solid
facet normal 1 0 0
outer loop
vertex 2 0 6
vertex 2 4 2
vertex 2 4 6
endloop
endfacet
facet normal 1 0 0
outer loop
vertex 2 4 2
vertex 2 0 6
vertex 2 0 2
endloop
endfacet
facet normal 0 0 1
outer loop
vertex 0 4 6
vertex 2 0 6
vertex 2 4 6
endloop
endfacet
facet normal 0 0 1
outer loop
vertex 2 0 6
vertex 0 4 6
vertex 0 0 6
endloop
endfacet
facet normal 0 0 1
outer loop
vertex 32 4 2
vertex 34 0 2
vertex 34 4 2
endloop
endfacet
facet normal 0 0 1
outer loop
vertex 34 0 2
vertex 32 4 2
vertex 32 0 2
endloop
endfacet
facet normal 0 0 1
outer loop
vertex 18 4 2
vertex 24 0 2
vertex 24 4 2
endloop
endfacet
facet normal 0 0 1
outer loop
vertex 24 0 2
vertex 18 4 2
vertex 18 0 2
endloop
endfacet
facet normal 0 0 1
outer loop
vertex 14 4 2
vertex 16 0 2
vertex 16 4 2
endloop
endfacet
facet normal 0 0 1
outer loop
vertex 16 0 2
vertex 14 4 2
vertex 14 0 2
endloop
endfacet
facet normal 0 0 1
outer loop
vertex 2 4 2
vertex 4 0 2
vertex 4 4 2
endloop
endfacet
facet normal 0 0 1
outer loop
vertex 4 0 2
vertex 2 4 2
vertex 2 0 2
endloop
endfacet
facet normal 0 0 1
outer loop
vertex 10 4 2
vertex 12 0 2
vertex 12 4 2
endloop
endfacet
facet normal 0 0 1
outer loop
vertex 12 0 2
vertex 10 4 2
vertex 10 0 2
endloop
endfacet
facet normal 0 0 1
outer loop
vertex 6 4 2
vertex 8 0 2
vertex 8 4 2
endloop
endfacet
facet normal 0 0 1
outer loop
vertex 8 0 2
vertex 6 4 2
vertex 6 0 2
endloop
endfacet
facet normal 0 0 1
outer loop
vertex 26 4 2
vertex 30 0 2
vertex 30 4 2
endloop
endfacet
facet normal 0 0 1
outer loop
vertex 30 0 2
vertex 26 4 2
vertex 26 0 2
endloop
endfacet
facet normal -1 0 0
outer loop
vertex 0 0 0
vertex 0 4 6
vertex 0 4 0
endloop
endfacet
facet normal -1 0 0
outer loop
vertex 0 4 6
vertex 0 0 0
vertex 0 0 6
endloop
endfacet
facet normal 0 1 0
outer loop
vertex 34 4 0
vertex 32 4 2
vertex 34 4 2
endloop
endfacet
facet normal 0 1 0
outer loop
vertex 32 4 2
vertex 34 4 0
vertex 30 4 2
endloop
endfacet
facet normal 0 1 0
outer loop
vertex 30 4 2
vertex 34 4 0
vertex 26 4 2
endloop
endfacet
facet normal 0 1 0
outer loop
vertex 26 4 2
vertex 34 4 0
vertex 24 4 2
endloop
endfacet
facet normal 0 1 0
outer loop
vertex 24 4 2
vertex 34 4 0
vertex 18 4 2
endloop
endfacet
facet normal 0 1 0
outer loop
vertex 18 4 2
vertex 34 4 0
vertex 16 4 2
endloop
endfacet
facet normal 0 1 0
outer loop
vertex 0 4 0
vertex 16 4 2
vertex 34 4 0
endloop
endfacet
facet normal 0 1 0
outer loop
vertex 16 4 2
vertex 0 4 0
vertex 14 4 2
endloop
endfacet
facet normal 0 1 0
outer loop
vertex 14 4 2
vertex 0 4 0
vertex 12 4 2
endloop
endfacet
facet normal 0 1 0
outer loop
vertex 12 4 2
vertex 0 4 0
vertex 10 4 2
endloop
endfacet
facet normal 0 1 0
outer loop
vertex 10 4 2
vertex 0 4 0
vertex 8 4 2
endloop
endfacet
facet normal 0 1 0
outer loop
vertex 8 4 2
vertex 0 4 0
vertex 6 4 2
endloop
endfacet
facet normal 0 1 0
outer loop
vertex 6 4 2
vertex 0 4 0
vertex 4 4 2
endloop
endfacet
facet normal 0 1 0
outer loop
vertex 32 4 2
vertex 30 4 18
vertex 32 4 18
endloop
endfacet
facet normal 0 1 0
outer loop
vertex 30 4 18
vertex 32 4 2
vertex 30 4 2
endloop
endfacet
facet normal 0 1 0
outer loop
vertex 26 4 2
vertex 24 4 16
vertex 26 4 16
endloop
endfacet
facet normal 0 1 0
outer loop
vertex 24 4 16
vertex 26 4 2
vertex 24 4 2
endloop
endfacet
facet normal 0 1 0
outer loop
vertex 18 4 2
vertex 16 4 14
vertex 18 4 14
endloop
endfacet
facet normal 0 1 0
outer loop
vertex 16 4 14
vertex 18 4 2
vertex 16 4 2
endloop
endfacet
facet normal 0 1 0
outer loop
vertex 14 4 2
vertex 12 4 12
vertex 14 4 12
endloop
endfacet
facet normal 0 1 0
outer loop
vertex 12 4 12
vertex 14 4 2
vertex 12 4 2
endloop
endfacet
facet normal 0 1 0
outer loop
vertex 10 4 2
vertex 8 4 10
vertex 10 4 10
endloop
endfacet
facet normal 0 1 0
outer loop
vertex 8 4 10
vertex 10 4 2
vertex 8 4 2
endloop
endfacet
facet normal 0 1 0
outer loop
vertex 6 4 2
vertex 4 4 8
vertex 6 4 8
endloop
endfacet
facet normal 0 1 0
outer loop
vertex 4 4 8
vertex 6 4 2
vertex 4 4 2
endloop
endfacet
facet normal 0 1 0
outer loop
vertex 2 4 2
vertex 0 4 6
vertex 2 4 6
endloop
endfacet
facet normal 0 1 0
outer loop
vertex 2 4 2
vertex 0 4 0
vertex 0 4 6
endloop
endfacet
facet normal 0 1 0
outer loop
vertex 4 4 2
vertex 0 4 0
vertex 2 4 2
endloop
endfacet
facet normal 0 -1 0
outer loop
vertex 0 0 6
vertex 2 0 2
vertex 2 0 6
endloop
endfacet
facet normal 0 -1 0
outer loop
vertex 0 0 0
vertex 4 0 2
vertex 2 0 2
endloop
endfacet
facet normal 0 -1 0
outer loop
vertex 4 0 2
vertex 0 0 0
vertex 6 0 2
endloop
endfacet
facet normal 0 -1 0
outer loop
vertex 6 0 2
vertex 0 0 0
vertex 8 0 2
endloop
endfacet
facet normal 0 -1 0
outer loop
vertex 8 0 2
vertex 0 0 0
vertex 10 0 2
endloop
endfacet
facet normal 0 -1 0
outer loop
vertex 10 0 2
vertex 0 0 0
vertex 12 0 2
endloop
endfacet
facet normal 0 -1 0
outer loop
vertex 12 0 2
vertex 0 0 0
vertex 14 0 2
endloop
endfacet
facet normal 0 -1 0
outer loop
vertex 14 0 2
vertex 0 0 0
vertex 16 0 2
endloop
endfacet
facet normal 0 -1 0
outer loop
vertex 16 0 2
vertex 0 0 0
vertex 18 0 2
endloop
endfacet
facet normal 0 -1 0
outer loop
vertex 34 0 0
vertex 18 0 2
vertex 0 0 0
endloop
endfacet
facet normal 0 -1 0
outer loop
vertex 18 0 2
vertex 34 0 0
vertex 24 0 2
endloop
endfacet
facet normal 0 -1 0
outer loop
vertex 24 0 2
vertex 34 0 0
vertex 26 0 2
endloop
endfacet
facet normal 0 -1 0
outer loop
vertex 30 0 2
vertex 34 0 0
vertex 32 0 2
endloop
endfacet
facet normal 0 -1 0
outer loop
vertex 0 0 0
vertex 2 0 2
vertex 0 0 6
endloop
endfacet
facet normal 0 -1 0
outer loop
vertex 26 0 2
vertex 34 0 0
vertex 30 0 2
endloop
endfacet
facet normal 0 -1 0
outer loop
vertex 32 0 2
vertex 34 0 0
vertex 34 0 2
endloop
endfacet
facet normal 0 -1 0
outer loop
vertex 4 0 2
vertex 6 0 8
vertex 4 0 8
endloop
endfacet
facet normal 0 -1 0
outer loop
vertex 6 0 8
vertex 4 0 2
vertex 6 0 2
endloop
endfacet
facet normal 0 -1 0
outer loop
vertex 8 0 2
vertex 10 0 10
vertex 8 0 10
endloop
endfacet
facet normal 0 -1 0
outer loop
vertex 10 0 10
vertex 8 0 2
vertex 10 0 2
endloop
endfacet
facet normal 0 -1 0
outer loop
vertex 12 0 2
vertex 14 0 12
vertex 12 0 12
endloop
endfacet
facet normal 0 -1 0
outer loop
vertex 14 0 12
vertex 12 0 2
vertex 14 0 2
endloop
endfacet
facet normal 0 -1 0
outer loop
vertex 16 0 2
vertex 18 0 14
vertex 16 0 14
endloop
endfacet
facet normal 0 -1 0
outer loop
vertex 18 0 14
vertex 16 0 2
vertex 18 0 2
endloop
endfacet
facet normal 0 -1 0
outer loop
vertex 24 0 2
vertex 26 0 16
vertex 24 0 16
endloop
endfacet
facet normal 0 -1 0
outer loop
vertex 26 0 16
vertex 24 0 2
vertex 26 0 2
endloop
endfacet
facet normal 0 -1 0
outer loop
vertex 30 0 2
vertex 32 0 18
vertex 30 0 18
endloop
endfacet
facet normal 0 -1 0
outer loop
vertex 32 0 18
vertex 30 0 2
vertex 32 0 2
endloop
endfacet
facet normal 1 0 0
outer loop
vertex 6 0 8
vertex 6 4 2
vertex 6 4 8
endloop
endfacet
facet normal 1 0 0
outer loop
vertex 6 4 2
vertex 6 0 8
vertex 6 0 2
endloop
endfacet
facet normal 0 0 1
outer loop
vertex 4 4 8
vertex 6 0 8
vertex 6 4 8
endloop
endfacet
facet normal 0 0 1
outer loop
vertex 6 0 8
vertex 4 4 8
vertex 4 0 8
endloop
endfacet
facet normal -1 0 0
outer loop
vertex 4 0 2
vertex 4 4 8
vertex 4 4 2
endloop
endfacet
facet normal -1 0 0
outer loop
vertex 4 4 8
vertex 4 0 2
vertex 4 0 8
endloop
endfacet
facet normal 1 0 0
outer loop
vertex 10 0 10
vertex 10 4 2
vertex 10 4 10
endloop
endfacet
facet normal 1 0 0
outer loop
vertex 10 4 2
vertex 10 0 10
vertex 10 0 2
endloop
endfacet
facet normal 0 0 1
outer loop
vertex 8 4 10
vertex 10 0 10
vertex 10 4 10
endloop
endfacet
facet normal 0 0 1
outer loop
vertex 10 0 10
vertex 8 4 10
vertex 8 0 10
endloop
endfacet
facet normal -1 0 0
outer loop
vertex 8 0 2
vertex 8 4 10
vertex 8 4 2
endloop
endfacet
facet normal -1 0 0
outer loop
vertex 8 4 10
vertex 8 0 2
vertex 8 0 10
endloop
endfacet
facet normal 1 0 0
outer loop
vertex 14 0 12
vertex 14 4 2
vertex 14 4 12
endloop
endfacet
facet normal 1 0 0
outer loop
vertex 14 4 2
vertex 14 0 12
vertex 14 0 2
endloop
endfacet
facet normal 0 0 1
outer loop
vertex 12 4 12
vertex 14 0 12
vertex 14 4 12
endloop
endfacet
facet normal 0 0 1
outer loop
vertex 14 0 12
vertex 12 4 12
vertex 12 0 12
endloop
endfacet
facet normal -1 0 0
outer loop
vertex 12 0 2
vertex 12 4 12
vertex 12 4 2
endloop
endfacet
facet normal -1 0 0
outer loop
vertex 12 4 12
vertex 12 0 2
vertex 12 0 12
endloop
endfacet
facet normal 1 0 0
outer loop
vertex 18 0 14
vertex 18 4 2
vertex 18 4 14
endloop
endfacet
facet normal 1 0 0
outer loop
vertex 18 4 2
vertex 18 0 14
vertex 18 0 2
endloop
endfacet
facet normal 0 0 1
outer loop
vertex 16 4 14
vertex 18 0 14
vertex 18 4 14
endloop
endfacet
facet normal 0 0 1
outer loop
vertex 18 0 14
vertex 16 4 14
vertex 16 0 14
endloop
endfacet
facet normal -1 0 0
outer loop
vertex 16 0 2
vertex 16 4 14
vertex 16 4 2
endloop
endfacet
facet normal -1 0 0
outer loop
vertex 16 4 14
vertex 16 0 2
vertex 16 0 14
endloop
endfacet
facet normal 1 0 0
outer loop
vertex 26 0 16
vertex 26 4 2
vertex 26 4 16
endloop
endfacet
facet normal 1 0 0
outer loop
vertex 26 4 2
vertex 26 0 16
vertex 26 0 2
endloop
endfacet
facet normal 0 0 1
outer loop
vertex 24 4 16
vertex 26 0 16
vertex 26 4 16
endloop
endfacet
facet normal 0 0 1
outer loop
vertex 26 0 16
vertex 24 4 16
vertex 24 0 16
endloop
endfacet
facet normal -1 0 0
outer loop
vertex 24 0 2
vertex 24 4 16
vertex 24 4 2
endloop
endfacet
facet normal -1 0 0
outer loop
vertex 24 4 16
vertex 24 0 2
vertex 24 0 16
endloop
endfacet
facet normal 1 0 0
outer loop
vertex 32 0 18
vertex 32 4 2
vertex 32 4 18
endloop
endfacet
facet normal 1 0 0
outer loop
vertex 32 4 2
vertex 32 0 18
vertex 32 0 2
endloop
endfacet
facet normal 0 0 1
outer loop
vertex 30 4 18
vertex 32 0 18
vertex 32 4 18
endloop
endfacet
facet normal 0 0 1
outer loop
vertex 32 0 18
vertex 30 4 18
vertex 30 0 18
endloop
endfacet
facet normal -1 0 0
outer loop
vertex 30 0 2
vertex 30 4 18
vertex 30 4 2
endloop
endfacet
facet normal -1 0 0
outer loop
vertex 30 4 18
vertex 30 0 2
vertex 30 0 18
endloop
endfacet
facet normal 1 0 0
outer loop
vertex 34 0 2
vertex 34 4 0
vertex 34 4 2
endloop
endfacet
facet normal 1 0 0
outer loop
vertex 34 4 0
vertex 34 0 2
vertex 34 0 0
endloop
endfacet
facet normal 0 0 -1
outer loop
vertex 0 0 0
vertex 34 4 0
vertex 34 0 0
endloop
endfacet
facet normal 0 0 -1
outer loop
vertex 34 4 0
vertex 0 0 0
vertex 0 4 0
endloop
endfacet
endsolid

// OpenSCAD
// Purpose: each, ranges with step, nested and C-style for expressions – comb structure.
xs = [each [0 : 4 : 16], each [24, 30]];
hs = [for (i = 0, h = 4; i < len(xs); i = i + 1, h = h + 2) h];
pairs = [for (i = [0 : 1], j = [i : 2]) [i, j]];
echo(xs = xs, hs = hs, pairs = pairs);
echo(r = [0 : 0.5 : 2], rev = [for (i = [3 : -1 : 0]) i]);
cube([34, 4, 2]);
for (i = [0 : len(xs) - 1]) translate([xs[i], 0, 2]) cube([2, 4, hs[i]]);
